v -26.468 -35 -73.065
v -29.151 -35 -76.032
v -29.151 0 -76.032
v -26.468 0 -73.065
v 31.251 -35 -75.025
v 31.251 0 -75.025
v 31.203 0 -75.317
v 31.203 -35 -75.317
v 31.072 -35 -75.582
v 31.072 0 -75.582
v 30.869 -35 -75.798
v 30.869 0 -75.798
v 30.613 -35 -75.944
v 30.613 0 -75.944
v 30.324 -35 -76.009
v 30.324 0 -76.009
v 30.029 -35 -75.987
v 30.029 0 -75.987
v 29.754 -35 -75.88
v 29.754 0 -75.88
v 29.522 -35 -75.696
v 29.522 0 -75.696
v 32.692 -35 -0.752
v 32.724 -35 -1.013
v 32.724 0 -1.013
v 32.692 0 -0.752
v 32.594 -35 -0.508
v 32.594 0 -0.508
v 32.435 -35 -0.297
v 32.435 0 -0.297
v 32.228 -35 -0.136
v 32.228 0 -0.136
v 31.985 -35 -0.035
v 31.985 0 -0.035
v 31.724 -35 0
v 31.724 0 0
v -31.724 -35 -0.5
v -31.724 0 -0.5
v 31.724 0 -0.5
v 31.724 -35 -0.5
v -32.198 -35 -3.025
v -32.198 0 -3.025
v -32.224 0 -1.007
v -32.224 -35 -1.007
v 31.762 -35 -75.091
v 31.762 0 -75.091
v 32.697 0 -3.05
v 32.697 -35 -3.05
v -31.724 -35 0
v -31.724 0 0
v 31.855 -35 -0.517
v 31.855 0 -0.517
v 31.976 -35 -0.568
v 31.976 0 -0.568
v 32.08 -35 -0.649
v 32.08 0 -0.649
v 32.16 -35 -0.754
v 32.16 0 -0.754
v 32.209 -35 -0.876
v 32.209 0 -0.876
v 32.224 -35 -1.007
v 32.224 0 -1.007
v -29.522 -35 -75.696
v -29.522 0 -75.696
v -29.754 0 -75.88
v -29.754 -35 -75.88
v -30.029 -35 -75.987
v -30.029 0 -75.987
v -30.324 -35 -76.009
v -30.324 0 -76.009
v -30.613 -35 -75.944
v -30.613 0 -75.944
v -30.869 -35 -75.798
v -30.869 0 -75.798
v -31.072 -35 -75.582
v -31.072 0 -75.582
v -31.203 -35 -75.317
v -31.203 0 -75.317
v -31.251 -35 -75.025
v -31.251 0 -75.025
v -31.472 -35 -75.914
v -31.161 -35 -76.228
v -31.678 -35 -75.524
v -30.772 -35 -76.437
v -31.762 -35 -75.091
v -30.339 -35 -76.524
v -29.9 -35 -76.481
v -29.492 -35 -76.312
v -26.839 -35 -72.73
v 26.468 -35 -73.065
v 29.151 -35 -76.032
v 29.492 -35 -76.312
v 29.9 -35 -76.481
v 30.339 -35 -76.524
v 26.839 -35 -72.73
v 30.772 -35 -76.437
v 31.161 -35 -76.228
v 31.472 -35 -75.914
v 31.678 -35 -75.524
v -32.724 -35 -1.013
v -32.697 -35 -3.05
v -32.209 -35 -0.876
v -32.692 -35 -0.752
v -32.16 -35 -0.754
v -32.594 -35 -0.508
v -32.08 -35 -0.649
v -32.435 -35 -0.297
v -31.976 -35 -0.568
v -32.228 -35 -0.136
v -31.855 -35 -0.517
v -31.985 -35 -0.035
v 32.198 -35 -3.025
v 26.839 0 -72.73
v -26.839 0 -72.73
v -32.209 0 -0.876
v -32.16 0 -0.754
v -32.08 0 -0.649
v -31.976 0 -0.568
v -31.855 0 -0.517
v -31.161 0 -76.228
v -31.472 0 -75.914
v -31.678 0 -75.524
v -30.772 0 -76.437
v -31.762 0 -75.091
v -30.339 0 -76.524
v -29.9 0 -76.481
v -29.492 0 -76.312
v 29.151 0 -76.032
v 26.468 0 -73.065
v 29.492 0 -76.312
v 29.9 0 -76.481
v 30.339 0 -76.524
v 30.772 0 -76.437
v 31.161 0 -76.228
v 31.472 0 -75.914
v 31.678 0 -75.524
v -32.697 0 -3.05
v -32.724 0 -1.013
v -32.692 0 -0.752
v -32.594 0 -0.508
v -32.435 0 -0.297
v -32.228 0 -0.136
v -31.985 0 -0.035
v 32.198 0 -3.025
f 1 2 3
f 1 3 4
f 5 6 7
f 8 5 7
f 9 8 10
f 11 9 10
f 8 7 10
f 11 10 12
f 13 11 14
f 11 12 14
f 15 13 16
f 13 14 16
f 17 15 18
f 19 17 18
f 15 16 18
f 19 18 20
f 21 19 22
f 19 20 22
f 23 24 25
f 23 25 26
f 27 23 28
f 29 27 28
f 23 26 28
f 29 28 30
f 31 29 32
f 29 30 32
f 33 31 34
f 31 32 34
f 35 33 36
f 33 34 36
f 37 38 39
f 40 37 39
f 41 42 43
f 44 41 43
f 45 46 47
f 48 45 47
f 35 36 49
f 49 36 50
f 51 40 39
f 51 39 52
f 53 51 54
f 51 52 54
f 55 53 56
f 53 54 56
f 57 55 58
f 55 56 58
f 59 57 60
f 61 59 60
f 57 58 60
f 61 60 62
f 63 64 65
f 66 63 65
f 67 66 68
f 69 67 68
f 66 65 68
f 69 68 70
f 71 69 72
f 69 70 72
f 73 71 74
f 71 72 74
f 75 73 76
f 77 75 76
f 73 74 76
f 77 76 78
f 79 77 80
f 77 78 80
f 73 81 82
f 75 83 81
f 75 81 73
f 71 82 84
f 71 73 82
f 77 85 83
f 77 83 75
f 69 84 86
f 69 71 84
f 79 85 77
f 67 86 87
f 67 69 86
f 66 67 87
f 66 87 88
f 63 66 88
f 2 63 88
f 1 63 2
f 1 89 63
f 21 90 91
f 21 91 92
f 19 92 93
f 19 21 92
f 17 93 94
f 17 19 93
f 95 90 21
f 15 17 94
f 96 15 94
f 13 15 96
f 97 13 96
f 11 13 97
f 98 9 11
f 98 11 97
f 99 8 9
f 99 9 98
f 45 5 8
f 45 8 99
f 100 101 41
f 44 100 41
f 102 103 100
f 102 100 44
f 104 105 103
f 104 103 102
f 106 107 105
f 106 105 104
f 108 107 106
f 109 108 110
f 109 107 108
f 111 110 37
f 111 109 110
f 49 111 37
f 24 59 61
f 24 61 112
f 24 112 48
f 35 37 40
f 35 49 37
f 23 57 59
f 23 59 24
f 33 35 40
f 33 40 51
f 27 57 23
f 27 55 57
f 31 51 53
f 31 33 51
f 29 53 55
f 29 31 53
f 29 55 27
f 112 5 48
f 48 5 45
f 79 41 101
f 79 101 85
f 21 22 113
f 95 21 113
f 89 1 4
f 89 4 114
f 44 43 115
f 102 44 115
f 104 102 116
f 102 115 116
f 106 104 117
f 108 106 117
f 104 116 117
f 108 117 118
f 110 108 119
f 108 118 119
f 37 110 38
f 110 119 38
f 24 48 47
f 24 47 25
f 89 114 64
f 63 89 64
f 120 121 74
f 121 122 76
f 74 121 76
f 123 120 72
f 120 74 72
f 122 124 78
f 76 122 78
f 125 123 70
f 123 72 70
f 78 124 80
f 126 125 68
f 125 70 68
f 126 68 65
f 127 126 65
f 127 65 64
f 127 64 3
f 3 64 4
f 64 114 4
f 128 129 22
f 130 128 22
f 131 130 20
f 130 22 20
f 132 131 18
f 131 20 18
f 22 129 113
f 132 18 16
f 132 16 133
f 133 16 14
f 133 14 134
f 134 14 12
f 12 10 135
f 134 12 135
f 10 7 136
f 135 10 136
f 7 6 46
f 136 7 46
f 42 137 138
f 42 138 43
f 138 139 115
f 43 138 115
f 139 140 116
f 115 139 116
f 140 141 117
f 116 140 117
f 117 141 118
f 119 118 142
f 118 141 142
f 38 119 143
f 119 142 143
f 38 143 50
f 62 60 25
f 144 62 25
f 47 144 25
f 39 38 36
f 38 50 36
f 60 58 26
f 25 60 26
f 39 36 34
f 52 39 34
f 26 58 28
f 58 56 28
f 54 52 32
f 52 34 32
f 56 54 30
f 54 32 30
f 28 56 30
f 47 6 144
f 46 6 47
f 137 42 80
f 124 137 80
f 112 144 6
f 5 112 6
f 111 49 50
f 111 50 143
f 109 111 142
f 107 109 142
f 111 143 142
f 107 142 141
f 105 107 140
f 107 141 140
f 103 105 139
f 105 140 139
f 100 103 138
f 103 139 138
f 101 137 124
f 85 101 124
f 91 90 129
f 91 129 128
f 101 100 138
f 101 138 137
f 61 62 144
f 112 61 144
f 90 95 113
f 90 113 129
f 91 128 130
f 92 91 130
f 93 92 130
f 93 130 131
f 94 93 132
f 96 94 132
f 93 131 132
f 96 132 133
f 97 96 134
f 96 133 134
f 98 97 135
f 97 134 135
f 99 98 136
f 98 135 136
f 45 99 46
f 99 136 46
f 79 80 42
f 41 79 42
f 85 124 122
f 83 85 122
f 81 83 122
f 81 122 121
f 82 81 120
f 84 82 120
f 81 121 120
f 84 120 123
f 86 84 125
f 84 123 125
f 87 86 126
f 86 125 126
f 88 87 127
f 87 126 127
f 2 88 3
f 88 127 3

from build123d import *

# Parameters (mm, degrees)
F1_DEPTH = 35


with BuildPart() as f1:
    # F0 (on Front) → F1 (new body)
    with BuildSketch(Plane.XZ):
        with BuildLine():
            Line((12.085786, 0), (0, 0))
            Line((0, 0), (0, -0.5))
            Line((0, -0.5), (12.085786, -0.5))
            Line((12.085786, -0.5), (31.724476, -0.5))
            ThreePointArc((31.724476, -0.5), (32.080347, -0.64878), (32.224432, -1.006578))
            Line((32.224432, -1.006578), (32.197876, -3.025085))
            Line((32.197876, -3.025085), (31.25063, -75.025085))
            ThreePointArc((31.25063, -75.025085), (30.612597, -75.944154), (29.521571, -75.696289))
            Line((29.521571, -75.696289), (26.838608, -72.729523))
            Line((26.838608, -72.729523), (26.467762, -73.064893))
            Line((26.467762, -73.064893), (29.150726, -76.03166))
            ThreePointArc((29.150726, -76.03166), (30.771804, -76.436713), (31.761848, -75.090692))
            Line((31.761848, -75.090692), (32.697247, -3.05017))
            Line((32.697247, -3.05017), (32.723698, -1.012983))
            ThreePointArc((32.723698, -1.012983), (32.435465, -0.297498), (31.723783, 0))
            Line((31.723783, 0), (12.085786, 0))
        make_face()
        with BuildLine():
            Line((0, -0.5), (0, 0))
            Line((0, 0), (-12.085786, 0))
            Line((-12.085786, 0), (-31.723783, 0))
            ThreePointArc((-31.723783, 0), (-32.435465, -0.297498), (-32.723698, -1.012983))
            Line((-32.723698, -1.012983), (-32.697247, -3.05017))
            Line((-32.697247, -3.05017), (-31.761848, -75.090692))
            ThreePointArc((-31.761848, -75.090692), (-30.771804, -76.436713), (-29.150726, -76.03166))
            Line((-29.150726, -76.03166), (-26.467762, -73.064893))
            Line((-26.467762, -73.064893), (-26.838608, -72.729523))
            Line((-26.838608, -72.729523), (-29.521571, -75.696289))
            ThreePointArc((-29.521571, -75.696289), (-30.612597, -75.944154), (-31.25063, -75.025085))
            Line((-31.25063, -75.025085), (-32.197876, -3.025085))
            Line((-32.197876, -3.025085), (-32.224432, -1.006578))
            ThreePointArc((-32.224432, -1.006578), (-32.080347, -0.64878), (-31.724476, -0.5))
            Line((-31.724476, -0.5), (-12.085786, -0.5))
            Line((-12.085786, -0.5), (0, -0.5))
        make_face()
    extrude(amount=F1_DEPTH)


solid = f1.part
